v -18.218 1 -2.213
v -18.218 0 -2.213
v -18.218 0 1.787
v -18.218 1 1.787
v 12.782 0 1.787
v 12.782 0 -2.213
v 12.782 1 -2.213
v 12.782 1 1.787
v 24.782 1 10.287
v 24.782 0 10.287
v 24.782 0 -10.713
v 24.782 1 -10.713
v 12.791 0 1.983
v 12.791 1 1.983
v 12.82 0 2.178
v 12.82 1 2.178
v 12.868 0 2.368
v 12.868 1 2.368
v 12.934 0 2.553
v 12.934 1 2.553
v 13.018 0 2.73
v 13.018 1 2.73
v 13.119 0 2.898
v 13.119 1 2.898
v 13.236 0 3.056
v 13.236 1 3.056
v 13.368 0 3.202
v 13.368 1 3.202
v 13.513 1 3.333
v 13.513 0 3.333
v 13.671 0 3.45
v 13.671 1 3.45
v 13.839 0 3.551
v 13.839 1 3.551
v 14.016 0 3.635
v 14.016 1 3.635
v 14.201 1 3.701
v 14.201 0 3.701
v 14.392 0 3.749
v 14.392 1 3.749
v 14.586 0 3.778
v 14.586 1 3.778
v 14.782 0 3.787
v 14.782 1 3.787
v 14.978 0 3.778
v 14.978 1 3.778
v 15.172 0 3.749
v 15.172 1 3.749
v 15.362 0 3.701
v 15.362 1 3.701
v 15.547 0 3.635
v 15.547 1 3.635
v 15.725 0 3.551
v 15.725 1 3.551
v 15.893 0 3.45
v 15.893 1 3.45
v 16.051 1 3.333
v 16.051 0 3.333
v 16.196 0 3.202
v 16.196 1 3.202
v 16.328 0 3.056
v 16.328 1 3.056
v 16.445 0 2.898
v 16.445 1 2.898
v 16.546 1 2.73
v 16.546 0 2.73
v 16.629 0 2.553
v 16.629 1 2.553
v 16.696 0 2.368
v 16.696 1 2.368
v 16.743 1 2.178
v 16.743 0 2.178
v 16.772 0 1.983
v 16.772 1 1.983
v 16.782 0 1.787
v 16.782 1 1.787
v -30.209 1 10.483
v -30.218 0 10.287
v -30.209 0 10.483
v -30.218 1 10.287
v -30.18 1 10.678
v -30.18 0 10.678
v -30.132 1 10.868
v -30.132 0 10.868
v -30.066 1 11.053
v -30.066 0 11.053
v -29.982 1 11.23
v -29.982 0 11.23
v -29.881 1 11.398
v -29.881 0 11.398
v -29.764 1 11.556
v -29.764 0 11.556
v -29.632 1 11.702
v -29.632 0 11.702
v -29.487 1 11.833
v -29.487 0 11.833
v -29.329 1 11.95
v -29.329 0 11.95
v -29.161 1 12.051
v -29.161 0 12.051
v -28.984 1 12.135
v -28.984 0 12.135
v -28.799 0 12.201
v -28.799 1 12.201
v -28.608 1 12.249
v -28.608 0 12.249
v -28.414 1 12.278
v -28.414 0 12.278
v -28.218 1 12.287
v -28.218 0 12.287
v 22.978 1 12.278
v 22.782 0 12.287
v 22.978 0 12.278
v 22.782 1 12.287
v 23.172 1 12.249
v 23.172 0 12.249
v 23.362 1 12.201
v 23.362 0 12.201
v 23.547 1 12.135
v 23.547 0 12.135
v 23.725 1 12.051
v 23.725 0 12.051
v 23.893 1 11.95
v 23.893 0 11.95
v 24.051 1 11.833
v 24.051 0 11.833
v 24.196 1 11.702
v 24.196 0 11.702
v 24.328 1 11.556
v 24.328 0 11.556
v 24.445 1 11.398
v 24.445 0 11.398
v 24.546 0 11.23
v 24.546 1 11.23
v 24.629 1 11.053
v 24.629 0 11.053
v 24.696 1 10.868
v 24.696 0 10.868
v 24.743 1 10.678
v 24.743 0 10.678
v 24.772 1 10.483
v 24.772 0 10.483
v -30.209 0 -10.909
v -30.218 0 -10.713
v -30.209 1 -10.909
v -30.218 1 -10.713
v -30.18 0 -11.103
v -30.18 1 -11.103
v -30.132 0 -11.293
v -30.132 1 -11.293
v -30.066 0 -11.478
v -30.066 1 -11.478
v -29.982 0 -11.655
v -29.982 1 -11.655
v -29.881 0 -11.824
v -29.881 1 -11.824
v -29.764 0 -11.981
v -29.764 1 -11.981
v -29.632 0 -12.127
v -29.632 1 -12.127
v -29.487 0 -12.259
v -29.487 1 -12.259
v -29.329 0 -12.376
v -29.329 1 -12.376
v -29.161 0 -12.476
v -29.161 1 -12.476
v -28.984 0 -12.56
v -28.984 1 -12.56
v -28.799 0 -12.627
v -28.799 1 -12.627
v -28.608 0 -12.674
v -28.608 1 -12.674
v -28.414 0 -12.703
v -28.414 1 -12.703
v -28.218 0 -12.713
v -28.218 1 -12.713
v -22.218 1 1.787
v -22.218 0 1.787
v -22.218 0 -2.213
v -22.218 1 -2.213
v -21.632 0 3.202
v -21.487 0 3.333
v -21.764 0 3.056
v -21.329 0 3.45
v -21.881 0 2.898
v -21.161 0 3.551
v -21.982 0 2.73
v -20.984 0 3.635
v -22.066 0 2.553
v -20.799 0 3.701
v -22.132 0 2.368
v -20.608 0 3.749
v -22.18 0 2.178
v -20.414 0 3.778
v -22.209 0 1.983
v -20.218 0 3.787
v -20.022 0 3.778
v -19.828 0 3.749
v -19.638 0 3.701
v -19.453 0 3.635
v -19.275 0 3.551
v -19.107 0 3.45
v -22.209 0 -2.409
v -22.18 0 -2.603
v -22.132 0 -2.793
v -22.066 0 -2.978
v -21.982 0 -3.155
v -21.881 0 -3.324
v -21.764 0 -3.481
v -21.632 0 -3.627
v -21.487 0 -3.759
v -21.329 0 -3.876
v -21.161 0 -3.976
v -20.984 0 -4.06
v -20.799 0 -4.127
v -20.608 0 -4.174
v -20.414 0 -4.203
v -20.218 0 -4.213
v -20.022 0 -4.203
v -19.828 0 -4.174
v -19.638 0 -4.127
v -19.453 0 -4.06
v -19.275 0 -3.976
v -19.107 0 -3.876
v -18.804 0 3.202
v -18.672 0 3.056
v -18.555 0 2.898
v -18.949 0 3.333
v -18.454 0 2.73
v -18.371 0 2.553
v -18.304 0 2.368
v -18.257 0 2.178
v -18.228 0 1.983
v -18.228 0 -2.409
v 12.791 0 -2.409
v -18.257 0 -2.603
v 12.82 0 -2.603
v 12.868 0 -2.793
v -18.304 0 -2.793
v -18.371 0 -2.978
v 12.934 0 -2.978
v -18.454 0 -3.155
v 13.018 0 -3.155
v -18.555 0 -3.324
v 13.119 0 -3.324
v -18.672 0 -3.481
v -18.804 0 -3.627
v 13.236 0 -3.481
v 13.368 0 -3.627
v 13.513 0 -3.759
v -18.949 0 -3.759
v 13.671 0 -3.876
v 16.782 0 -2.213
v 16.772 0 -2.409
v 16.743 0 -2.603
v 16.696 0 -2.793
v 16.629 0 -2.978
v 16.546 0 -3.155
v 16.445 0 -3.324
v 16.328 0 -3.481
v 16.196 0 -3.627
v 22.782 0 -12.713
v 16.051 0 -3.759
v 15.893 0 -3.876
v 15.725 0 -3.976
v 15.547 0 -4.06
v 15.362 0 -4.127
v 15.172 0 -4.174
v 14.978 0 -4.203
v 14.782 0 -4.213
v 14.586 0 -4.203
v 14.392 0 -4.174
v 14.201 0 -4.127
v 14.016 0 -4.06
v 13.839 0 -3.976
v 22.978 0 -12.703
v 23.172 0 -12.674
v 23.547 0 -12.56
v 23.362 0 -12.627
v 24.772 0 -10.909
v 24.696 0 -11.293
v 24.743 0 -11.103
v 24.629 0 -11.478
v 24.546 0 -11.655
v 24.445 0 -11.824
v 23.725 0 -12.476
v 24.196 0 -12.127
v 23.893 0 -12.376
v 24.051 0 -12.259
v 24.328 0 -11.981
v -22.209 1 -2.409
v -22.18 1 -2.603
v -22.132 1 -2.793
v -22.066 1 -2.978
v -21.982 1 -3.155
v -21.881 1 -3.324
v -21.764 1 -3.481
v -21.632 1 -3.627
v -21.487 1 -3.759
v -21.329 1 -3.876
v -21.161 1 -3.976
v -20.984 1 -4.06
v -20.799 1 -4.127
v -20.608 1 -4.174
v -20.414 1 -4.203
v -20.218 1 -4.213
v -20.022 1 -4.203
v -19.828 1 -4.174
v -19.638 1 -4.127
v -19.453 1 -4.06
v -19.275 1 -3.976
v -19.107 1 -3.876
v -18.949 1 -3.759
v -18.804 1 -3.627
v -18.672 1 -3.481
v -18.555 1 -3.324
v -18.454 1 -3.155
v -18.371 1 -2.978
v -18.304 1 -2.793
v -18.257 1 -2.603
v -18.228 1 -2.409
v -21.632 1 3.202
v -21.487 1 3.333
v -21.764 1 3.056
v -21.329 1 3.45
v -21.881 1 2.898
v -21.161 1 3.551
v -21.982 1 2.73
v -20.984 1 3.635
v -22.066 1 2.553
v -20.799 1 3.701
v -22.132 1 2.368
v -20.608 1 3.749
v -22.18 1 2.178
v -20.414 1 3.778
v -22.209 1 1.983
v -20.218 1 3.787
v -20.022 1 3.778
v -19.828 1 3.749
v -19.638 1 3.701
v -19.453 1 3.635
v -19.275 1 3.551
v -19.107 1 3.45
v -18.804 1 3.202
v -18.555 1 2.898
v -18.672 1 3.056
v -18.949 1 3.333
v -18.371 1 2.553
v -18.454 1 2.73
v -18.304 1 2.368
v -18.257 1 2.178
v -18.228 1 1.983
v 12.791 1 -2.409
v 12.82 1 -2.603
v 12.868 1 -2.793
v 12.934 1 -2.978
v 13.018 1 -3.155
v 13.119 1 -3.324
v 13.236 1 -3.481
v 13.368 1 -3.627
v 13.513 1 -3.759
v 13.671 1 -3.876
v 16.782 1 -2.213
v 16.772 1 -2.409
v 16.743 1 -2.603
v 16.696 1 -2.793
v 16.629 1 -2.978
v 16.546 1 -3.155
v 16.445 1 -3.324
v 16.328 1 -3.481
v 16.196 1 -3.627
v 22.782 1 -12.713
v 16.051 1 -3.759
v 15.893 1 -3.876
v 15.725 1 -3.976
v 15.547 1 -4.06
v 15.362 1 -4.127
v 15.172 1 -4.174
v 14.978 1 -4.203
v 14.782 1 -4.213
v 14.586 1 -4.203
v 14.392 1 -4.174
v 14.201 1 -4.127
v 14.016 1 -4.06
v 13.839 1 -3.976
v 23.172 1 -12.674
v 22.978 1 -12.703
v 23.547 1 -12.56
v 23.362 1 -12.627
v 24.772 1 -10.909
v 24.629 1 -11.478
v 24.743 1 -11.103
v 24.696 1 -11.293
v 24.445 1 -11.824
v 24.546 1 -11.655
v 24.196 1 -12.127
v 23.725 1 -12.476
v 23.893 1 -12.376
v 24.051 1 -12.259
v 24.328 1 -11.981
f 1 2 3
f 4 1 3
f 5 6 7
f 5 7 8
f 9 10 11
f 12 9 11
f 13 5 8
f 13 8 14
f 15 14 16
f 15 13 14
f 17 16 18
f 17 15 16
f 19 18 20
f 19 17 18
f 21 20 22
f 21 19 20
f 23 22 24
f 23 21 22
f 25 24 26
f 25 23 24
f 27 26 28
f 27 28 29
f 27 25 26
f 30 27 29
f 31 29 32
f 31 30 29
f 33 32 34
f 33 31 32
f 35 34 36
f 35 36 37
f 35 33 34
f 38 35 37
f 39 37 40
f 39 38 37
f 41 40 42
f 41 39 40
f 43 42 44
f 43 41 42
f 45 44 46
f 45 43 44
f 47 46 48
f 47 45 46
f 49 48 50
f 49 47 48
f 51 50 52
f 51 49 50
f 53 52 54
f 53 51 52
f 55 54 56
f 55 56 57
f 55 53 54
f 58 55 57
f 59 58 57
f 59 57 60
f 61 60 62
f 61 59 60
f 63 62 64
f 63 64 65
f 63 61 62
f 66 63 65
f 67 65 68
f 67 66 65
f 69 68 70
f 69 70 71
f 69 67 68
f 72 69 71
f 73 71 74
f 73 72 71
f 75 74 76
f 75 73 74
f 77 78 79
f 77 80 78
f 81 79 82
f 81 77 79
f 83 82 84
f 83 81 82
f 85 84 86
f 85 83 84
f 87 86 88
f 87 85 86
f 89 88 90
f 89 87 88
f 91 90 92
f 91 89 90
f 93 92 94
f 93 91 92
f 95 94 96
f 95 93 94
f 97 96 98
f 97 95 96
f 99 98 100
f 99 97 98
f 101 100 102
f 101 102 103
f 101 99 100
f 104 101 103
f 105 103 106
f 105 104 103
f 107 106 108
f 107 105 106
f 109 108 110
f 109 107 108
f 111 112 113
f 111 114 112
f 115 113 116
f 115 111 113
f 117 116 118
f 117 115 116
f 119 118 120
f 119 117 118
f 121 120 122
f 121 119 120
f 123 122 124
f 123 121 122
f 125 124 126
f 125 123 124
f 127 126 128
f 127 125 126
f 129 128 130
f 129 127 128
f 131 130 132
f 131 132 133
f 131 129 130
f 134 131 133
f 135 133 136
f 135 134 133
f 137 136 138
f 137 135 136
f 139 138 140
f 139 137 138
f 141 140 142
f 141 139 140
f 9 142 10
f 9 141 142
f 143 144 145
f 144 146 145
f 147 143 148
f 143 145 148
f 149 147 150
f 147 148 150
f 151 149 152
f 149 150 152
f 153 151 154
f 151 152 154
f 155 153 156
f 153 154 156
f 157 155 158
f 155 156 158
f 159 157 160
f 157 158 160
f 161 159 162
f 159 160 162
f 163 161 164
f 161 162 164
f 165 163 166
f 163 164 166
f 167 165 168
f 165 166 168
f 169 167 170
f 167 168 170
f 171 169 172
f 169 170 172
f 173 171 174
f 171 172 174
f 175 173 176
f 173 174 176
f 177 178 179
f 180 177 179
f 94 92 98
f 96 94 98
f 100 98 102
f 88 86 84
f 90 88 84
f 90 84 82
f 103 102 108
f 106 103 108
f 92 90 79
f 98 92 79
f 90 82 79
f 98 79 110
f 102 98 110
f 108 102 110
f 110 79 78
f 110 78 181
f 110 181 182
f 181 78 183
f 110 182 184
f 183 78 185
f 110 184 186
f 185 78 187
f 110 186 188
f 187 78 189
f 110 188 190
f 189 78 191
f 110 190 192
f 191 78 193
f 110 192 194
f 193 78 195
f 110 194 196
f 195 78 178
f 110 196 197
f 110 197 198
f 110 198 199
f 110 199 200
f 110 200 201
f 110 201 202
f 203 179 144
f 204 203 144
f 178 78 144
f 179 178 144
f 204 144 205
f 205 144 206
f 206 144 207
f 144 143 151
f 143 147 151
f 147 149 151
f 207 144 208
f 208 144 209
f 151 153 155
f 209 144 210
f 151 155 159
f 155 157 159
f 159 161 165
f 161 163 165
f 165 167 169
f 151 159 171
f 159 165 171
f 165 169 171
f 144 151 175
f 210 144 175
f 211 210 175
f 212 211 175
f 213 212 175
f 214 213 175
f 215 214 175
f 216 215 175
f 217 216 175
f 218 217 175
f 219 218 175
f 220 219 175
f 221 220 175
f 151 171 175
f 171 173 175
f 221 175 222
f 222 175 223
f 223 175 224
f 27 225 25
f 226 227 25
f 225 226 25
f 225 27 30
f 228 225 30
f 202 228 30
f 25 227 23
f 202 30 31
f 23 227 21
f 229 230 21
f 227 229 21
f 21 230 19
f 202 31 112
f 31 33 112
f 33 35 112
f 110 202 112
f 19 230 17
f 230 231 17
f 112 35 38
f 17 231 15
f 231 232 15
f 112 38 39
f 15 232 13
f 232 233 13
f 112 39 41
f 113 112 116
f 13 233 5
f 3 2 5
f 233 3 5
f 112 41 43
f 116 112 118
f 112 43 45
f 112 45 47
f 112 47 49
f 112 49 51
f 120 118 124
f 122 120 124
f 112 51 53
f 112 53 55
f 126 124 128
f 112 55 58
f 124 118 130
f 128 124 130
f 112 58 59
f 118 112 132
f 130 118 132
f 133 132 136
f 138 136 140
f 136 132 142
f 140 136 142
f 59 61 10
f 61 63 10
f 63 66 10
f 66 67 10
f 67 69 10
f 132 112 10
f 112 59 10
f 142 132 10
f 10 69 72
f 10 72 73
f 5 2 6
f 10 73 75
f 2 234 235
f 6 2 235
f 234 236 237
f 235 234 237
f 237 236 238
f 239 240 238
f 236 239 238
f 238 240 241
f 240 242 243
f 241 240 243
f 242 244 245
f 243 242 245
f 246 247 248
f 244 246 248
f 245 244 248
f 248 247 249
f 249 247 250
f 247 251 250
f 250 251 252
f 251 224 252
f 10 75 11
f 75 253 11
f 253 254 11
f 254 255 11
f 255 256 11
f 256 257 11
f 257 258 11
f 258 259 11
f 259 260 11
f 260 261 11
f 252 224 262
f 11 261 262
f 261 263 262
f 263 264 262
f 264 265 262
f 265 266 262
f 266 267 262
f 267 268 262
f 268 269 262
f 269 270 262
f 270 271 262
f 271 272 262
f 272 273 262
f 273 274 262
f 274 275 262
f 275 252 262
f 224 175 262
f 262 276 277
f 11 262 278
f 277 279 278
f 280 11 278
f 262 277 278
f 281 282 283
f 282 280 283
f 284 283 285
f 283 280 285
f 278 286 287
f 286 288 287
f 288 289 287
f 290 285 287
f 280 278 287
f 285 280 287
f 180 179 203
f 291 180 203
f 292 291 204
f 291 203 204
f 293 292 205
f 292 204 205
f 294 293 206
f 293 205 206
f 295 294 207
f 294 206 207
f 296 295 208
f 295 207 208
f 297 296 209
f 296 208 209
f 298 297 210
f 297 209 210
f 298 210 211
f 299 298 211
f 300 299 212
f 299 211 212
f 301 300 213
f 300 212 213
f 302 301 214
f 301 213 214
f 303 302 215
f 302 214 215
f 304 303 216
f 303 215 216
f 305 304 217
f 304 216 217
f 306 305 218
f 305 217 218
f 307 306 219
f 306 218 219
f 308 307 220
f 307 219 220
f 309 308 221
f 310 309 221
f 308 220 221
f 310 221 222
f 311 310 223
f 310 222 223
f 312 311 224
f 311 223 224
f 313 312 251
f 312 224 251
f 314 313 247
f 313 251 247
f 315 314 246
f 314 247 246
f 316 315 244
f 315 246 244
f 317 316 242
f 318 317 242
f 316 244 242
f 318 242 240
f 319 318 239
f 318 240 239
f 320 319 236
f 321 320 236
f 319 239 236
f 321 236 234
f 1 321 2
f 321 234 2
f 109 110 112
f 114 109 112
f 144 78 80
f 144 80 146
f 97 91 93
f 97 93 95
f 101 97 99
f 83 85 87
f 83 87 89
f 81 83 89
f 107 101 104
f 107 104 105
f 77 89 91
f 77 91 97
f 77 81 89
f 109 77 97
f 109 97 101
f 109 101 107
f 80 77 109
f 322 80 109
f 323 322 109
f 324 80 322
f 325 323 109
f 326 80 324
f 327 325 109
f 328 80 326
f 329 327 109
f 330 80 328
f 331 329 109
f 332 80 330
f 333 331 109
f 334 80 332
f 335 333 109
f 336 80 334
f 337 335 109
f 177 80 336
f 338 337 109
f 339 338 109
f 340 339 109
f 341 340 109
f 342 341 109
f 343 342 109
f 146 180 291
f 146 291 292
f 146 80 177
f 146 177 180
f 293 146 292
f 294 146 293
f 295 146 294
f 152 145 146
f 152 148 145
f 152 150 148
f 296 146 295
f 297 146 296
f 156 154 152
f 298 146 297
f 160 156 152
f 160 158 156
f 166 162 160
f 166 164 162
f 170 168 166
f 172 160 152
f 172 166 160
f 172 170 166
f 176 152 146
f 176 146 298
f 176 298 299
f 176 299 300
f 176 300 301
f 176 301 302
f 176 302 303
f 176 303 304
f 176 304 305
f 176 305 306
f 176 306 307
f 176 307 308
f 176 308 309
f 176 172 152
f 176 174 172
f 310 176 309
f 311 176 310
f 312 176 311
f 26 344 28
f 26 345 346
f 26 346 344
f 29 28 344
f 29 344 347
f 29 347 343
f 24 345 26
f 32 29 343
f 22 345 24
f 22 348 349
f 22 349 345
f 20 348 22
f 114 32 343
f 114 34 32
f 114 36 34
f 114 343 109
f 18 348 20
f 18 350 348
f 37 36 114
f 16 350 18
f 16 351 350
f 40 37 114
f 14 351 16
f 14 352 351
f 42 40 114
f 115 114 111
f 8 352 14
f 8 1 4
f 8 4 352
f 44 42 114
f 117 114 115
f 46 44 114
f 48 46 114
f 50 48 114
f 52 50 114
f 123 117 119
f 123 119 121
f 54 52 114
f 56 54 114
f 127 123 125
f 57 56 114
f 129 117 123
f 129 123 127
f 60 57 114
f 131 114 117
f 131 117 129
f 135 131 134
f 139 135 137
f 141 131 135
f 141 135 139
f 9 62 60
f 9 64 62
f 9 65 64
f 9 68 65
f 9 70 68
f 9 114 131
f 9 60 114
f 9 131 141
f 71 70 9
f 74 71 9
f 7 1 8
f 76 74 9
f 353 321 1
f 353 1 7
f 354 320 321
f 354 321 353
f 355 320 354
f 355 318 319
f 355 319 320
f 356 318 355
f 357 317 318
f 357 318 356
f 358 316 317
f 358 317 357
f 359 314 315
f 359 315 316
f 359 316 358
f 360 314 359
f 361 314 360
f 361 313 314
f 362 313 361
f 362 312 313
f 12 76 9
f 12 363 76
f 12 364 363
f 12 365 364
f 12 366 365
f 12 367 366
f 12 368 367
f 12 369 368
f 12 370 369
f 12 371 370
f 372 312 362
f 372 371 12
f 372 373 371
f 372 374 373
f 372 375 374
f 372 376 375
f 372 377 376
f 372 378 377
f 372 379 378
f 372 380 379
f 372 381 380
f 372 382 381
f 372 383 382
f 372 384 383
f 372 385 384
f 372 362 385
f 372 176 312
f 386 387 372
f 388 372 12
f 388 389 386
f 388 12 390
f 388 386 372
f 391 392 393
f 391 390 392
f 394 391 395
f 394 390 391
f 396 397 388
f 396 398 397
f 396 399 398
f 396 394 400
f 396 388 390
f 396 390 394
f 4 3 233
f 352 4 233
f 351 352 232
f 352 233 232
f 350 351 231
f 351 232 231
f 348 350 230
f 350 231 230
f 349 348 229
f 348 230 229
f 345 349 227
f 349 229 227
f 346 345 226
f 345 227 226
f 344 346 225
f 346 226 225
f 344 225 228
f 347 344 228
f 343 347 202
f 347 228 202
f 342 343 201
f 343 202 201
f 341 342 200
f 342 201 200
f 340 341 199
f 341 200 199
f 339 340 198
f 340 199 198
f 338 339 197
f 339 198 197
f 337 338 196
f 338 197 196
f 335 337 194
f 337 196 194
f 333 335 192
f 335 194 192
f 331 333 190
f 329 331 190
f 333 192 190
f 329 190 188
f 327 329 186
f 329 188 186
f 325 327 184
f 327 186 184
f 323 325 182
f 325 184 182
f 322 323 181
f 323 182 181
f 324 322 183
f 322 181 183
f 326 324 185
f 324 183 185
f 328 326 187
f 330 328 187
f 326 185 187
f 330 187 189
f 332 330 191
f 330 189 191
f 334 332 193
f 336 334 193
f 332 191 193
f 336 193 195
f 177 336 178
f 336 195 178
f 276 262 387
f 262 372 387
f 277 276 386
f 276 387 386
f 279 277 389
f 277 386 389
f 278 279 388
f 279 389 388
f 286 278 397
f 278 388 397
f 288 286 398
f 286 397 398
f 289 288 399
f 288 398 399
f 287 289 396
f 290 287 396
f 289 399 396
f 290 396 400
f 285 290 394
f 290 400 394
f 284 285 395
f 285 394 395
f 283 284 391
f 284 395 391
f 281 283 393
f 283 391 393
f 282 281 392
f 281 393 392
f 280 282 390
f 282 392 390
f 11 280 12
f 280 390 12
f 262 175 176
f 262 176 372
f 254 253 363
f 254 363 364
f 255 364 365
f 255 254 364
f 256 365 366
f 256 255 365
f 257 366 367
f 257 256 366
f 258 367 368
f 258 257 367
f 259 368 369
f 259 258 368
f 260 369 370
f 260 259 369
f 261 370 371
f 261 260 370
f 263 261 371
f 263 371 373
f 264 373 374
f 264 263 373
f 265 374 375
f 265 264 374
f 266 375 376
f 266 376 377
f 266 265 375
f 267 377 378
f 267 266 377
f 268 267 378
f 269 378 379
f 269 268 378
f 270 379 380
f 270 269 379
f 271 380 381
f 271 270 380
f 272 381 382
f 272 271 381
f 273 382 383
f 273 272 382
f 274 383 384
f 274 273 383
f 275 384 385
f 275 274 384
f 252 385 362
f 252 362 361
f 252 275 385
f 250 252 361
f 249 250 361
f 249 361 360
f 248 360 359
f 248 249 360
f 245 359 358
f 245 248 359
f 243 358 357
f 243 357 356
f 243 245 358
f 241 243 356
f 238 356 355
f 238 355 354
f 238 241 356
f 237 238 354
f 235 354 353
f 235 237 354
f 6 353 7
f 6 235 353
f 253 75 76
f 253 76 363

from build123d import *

# Parameters (mm, degrees)
SKETCH_1_W      = 55
SKETCH_1_H      = 25
EXTRUDE_1_DEPTH = 1
FILLET_1_R      = 2


with BuildPart() as part:
    # Эскиз1 → Бобышка-Вытянуть1 (new body)
    with BuildSketch(Plane(origin=(0, 0, 0), x_dir=(1, 0, 0), z_dir=(0, 1, 0))):
        with Locations((-2.718269759, 0.212657213)):
            Rectangle(SKETCH_1_W, SKETCH_1_H)
        with BuildLine():
            Line((-18.218269759, 2.212657213), (-18.218269759, -1.787342787))
            ThreePointArc((-18.218269759, -1.787342787), (-20.218269759, -3.787342787), (-22.218269759, -1.787342787))
            Line((-22.218269759, -1.787342787), (-22.218269759, 2.212657213))
            ThreePointArc((-22.218269759, 2.212657213), (-20.218269759, 4.212657213), (-18.218269759, 2.212657213))
        make_face(mode=Mode.SUBTRACT)
        with BuildLine():
            Line((12.781730241, 2.212657213), (12.781730241, -1.787342787))
            ThreePointArc((12.781730241, -1.787342787), (14.781730241, -3.787342787), (16.781730241, -1.787342787))
            Line((16.781730241, -1.787342787), (16.781730241, 2.212657213))
            ThreePointArc((16.781730241, 2.212657213), (14.781730241, 4.212657213), (12.781730241, 2.212657213))
        make_face(mode=Mode.SUBTRACT)
    extrude(amount=EXTRUDE_1_DEPTH)

    # Скругление1
    fillet_1_edges = [part.edges().sort_by_distance(p)[0] for p in [
        (24.781730241, 0.5, 12.287342787),
        (-30.218269759, 0.5, 12.287342787),
        (-30.218269759, 0.5, -12.712657213),
        (24.781730241, 0.5, -12.712657213),
    ]]
    fillet(fillet_1_edges, radius=FILLET_1_R)


solid = part.part
